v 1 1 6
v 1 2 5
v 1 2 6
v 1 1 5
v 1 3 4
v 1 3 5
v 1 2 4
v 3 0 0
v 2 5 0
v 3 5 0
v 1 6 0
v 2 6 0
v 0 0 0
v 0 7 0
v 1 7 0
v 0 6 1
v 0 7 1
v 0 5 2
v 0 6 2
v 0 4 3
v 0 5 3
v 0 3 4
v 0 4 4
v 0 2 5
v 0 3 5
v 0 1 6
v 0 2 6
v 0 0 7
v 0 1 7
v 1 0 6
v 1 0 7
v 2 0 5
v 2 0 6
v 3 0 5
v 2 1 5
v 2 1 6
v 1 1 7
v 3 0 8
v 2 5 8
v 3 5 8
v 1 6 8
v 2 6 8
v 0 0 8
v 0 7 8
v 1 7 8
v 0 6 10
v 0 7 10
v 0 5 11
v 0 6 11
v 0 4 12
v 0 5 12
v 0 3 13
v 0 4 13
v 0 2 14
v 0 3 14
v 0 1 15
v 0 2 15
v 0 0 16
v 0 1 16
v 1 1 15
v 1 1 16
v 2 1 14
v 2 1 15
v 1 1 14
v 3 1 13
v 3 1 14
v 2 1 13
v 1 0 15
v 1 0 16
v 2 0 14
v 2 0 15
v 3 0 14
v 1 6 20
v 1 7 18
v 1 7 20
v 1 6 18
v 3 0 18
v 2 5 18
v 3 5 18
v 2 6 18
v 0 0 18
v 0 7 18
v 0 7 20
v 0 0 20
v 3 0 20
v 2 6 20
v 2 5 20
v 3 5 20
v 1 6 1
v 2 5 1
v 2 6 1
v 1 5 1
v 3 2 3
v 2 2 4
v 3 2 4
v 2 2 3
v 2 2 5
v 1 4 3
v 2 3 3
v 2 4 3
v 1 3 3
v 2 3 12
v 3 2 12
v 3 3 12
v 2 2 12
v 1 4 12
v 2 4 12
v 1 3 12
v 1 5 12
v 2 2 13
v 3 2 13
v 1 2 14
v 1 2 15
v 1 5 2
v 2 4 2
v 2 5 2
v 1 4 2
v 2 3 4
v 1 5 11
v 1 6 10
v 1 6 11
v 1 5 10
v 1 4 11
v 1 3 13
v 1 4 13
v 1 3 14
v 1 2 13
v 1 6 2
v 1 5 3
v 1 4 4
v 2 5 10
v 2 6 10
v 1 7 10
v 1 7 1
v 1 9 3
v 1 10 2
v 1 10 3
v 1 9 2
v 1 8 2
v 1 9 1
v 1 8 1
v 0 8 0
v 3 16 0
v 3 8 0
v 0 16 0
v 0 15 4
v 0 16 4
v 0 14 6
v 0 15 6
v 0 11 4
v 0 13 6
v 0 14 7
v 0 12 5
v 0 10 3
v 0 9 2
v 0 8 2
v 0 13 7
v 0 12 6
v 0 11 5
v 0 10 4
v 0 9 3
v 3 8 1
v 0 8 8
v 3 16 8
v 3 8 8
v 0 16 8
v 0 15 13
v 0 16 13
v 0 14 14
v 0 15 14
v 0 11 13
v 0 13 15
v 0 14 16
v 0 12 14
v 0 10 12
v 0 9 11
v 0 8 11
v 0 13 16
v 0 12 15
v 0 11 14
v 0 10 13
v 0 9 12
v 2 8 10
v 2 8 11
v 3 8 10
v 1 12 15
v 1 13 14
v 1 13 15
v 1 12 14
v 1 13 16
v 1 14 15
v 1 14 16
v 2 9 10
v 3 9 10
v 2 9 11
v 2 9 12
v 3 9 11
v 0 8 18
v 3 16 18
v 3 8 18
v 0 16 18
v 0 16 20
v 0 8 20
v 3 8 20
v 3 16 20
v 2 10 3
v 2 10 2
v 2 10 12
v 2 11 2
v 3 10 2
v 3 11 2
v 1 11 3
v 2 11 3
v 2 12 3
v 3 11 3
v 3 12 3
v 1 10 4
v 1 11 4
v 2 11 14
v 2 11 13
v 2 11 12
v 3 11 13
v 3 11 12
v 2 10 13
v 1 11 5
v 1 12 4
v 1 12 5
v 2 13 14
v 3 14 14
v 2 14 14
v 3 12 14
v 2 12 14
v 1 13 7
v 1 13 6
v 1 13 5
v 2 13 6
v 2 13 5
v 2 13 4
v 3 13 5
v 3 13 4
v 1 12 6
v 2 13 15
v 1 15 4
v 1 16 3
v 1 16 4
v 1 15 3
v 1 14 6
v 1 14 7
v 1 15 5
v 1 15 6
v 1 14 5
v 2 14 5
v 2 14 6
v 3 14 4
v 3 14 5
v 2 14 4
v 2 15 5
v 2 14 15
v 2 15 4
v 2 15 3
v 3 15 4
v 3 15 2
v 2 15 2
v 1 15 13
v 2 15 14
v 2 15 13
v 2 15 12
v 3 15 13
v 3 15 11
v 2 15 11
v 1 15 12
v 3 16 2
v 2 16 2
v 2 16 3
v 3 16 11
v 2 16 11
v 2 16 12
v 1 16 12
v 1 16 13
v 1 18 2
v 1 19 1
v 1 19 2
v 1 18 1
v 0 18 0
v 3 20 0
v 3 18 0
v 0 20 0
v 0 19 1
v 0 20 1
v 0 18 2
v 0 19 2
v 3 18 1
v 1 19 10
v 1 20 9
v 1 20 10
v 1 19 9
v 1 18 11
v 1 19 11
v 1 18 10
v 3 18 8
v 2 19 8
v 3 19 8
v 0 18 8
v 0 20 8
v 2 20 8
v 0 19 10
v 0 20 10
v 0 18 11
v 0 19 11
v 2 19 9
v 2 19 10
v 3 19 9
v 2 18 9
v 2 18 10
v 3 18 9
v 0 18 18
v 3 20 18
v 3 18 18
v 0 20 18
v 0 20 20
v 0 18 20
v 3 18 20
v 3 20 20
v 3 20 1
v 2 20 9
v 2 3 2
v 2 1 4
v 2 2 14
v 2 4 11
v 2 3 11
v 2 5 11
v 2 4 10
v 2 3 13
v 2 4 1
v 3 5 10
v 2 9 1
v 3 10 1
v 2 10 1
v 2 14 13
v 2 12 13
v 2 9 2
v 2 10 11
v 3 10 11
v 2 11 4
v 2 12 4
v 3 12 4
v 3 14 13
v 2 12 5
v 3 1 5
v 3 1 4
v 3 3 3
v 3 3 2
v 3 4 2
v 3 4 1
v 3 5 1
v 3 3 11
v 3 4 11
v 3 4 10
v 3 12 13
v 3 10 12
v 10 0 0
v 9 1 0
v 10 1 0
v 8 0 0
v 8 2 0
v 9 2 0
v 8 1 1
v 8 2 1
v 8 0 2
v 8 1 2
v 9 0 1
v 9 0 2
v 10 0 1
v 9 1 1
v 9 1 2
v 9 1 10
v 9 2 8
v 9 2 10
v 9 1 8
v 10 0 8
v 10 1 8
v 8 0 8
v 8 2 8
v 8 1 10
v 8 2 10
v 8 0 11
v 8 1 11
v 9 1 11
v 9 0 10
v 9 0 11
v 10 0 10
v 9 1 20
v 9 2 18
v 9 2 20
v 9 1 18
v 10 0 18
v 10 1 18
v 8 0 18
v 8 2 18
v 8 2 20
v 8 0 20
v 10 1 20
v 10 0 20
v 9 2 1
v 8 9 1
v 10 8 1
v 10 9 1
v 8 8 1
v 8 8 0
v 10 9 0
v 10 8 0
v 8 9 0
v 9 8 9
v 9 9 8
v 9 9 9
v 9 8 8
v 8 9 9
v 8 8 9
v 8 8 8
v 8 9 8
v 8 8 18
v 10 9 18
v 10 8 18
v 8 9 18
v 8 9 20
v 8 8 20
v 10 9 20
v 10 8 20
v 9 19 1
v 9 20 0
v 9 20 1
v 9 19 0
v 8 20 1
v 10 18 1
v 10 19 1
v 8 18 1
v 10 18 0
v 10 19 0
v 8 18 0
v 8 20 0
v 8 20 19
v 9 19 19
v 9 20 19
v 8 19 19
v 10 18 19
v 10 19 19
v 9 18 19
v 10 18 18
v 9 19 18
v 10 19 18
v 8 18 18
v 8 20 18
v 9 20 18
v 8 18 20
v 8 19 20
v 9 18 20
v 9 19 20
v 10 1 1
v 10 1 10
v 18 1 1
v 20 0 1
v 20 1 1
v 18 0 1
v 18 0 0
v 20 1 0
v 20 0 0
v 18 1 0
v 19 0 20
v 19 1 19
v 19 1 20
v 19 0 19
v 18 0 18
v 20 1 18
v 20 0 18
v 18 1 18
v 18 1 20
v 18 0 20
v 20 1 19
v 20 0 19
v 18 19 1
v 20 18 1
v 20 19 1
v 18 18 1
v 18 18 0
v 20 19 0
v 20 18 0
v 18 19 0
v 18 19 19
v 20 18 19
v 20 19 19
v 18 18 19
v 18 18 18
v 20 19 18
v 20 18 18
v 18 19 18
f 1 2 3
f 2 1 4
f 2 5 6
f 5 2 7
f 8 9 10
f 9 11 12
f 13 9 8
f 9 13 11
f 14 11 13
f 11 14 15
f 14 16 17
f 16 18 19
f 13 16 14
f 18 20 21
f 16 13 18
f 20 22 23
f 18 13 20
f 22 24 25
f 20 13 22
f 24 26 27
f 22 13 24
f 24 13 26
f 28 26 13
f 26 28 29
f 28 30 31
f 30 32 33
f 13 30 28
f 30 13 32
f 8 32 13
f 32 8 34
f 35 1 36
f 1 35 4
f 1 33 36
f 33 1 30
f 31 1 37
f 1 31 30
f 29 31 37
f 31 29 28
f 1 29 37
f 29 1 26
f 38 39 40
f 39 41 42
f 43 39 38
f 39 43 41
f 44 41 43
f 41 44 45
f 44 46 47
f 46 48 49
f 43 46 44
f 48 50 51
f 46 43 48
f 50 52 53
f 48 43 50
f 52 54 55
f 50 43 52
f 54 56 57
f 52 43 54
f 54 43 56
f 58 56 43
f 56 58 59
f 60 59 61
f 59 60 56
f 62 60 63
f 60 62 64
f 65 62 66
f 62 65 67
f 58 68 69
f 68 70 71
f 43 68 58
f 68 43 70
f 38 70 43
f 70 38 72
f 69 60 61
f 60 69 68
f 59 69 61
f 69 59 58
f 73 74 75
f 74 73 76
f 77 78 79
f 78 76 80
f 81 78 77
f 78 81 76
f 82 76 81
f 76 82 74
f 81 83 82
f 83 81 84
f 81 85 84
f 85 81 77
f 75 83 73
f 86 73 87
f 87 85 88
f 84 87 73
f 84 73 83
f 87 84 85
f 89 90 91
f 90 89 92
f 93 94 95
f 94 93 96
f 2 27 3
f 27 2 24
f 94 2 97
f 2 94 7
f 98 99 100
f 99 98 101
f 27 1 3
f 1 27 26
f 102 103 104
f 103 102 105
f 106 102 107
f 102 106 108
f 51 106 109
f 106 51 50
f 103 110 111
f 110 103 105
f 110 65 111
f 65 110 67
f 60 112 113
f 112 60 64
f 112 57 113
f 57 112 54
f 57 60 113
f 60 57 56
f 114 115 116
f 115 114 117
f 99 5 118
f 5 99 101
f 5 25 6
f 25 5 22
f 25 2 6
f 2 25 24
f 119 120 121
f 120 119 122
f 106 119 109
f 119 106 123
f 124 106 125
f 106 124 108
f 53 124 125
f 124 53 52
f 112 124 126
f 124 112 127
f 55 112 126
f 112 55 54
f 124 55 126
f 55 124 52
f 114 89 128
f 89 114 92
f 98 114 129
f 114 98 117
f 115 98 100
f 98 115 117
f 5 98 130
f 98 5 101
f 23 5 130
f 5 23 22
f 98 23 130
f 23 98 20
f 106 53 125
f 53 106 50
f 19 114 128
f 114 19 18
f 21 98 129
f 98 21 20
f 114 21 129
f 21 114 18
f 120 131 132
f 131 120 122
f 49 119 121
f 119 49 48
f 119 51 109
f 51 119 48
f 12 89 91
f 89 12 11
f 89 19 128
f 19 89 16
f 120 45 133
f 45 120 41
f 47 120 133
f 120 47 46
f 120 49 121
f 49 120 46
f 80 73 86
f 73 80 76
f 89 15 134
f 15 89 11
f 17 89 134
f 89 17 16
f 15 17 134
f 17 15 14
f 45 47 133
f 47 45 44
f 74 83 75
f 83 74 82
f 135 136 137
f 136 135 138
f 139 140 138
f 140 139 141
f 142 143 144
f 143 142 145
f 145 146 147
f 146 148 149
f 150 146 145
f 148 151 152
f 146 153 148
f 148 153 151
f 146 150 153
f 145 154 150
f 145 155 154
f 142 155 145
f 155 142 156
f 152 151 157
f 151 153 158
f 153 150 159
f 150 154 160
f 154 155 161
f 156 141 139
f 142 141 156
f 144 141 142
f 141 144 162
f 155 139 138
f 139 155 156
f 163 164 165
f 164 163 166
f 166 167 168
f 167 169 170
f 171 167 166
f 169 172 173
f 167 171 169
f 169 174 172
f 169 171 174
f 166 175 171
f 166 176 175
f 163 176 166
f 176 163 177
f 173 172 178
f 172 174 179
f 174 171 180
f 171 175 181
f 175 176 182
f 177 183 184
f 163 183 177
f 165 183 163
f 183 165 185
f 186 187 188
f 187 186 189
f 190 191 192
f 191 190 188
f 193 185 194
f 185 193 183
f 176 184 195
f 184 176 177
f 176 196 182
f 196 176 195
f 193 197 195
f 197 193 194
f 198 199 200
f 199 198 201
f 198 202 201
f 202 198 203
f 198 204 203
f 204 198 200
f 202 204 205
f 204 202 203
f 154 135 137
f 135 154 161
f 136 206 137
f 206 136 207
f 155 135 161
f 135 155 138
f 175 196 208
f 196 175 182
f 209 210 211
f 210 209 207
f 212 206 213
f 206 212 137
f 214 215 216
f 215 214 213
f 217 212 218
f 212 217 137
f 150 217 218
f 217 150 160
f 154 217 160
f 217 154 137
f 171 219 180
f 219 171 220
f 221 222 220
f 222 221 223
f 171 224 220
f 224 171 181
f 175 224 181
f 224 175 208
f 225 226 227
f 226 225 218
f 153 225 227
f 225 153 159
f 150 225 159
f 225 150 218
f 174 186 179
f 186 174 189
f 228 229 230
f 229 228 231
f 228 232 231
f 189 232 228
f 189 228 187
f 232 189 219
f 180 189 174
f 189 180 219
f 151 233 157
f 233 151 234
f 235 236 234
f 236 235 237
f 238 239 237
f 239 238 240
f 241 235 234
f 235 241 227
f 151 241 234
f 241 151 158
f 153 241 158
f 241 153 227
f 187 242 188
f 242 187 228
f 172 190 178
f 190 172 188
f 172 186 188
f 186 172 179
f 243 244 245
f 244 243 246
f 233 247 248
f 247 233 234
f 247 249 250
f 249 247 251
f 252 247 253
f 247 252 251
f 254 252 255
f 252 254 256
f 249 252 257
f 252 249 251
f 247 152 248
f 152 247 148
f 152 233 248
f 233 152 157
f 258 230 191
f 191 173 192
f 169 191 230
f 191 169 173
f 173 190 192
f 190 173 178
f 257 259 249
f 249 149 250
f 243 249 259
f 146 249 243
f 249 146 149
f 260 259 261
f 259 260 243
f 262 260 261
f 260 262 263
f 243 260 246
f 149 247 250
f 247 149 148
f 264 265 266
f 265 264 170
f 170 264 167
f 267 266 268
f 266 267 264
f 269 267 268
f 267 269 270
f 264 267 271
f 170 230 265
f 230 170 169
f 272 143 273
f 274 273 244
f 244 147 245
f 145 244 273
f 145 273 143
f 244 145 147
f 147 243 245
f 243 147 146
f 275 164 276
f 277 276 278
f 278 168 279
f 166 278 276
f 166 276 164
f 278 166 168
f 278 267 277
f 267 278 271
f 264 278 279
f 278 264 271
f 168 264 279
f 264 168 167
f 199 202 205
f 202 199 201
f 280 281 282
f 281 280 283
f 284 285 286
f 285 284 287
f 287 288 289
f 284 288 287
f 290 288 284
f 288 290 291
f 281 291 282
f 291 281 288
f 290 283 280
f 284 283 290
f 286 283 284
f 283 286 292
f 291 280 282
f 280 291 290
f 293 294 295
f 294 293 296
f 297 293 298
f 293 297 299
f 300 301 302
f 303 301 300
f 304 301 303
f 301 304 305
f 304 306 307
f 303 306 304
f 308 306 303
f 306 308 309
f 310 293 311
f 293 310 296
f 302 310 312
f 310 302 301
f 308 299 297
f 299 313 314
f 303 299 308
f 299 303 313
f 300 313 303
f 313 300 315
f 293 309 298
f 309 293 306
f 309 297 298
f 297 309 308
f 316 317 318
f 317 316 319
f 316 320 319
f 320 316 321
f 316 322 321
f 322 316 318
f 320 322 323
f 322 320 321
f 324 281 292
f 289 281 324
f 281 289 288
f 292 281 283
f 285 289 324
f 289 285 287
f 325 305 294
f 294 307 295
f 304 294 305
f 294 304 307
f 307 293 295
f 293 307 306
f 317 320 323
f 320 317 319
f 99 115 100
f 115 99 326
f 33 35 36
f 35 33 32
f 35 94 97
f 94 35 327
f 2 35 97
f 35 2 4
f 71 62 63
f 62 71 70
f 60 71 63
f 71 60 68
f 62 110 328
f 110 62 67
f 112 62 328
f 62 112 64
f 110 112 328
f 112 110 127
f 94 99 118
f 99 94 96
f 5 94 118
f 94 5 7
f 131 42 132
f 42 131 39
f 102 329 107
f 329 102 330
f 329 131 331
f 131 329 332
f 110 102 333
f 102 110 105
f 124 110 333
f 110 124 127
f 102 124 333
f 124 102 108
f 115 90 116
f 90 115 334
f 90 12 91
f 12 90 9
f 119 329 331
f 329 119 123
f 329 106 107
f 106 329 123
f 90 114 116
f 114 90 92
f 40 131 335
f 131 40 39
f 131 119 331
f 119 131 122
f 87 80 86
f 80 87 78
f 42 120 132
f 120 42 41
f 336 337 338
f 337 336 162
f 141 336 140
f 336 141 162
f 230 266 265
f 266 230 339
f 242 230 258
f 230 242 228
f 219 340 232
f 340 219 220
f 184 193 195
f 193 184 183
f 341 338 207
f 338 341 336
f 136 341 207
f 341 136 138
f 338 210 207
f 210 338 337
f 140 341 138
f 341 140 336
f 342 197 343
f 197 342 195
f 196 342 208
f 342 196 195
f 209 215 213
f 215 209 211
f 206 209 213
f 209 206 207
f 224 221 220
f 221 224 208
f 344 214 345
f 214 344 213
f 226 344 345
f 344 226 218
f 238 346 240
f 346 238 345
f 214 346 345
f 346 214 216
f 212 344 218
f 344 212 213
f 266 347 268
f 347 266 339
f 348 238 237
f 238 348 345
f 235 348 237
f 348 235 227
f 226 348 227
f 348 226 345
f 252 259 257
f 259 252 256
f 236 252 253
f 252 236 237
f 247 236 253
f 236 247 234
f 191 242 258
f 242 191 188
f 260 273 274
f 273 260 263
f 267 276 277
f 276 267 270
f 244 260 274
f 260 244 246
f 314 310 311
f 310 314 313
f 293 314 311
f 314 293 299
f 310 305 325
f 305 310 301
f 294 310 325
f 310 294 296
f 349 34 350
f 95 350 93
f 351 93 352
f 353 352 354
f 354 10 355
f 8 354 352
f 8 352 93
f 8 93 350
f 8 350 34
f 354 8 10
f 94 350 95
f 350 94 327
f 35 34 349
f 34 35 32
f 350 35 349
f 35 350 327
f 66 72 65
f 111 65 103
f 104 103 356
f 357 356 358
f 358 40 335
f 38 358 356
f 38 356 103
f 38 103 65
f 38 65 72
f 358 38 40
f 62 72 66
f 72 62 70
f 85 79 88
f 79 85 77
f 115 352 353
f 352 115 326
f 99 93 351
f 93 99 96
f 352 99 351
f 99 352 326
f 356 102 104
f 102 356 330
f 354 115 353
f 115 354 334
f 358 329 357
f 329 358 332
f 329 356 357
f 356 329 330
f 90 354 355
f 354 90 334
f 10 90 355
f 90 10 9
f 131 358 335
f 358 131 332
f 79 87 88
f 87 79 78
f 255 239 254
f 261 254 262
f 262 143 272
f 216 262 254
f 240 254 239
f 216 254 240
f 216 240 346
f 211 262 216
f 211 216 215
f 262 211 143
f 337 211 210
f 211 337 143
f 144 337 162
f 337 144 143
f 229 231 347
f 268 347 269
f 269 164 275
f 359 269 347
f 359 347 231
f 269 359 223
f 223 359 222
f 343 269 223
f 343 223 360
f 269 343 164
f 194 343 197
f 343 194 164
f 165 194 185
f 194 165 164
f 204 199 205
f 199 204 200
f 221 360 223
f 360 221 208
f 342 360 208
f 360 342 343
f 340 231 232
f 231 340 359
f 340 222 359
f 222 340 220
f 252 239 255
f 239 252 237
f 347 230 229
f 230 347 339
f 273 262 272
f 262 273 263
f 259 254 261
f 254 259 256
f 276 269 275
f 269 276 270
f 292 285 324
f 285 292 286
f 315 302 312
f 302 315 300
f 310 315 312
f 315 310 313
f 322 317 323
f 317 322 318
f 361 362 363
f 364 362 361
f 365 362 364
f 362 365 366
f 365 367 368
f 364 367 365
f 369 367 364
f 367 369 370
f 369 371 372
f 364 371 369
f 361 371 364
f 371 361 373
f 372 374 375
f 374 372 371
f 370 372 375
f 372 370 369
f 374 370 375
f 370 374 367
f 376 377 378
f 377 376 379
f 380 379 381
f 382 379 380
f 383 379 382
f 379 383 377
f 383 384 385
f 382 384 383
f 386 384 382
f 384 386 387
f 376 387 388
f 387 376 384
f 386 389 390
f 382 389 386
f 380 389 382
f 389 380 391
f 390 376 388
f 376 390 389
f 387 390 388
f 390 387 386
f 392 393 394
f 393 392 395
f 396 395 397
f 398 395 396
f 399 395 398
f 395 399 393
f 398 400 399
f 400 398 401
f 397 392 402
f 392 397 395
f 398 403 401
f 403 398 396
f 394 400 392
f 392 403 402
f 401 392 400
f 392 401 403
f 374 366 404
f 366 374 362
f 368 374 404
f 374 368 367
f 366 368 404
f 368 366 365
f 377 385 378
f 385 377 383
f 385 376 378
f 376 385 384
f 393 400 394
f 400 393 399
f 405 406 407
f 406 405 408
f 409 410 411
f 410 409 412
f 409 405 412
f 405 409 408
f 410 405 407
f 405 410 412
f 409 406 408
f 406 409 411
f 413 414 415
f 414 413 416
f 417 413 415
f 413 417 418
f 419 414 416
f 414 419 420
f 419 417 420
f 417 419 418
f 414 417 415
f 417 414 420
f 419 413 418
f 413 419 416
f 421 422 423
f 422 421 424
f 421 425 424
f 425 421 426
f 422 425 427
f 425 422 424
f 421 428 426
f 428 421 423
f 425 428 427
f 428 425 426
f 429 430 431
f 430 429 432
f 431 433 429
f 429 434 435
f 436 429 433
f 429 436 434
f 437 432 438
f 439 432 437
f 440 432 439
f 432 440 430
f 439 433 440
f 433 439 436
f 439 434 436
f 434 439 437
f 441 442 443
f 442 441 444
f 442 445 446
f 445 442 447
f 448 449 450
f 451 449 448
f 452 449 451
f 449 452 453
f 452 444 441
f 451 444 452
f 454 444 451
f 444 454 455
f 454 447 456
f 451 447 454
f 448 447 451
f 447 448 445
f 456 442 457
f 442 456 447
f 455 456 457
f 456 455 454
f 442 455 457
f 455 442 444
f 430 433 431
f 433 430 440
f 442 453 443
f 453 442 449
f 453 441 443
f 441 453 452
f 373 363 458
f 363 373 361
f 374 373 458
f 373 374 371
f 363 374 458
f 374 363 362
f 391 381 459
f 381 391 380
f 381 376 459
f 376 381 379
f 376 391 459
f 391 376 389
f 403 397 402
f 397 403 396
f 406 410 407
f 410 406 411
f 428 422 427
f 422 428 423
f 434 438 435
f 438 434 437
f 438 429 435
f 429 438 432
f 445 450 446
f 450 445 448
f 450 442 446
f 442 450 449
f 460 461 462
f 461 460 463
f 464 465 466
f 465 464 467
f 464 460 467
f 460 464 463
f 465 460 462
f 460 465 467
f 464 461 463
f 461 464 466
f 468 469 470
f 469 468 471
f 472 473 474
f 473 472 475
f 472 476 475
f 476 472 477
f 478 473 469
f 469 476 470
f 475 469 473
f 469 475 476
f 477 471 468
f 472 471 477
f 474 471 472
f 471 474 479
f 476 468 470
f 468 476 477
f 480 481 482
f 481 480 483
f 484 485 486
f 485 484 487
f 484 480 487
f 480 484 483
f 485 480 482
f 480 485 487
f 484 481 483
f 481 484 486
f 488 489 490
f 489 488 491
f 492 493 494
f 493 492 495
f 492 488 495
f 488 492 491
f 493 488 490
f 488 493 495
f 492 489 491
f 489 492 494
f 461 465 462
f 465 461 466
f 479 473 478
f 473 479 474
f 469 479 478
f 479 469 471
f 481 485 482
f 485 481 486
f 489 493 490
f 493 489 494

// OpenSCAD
union() {
    translate([0, 0, 0]) cube([1, 1, 1]);
    translate([0, 0, 1]) cube([1, 1, 1]);
    translate([0, 0, 2]) cube([1, 1, 1]);
    translate([0, 0, 3]) cube([1, 1, 1]);
    translate([0, 0, 4]) cube([1, 1, 1]);
    translate([0, 0, 5]) cube([1, 1, 1]);
    translate([0, 0, 6]) cube([1, 1, 1]);
    translate([0, 0, 8]) cube([1, 1, 1]);
    translate([0, 0, 9]) cube([1, 1, 1]);
    translate([0, 0, 10]) cube([1, 1, 1]);
    translate([0, 0, 11]) cube([1, 1, 1]);
    translate([0, 0, 12]) cube([1, 1, 1]);
    translate([0, 0, 13]) cube([1, 1, 1]);
    translate([0, 0, 14]) cube([1, 1, 1]);
    translate([0, 0, 15]) cube([1, 1, 1]);
    translate([0, 0, 18]) cube([1, 1, 1]);
    translate([0, 0, 19]) cube([1, 1, 1]);
    translate([0, 1, 0]) cube([1, 1, 1]);
    translate([0, 1, 1]) cube([1, 1, 1]);
    translate([0, 1, 2]) cube([1, 1, 1]);
    translate([0, 1, 3]) cube([1, 1, 1]);
    translate([0, 1, 4]) cube([1, 1, 1]);
    translate([0, 1, 5]) cube([1, 1, 1]);
    translate([0, 1, 8]) cube([1, 1, 1]);
    translate([0, 1, 9]) cube([1, 1, 1]);
    translate([0, 1, 10]) cube([1, 1, 1]);
    translate([0, 1, 11]) cube([1, 1, 1]);
    translate([0, 1, 12]) cube([1, 1, 1]);
    translate([0, 1, 13]) cube([1, 1, 1]);
    translate([0, 1, 14]) cube([1, 1, 1]);
    translate([0, 1, 18]) cube([1, 1, 1]);
    translate([0, 1, 19]) cube([1, 1, 1]);
    translate([0, 2, 0]) cube([1, 1, 1]);
    translate([0, 2, 1]) cube([1, 1, 1]);
    translate([0, 2, 2]) cube([1, 1, 1]);
    translate([0, 2, 3]) cube([1, 1, 1]);
    translate([0, 2, 4]) cube([1, 1, 1]);
    translate([0, 2, 8]) cube([1, 1, 1]);
    translate([0, 2, 9]) cube([1, 1, 1]);
    translate([0, 2, 10]) cube([1, 1, 1]);
    translate([0, 2, 11]) cube([1, 1, 1]);
    translate([0, 2, 12]) cube([1, 1, 1]);
    translate([0, 2, 13]) cube([1, 1, 1]);
    translate([0, 2, 18]) cube([1, 1, 1]);
    translate([0, 2, 19]) cube([1, 1, 1]);
    translate([0, 3, 0]) cube([1, 1, 1]);
    translate([0, 3, 1]) cube([1, 1, 1]);
    translate([0, 3, 2]) cube([1, 1, 1]);
    translate([0, 3, 3]) cube([1, 1, 1]);
    translate([0, 3, 8]) cube([1, 1, 1]);
    translate([0, 3, 9]) cube([1, 1, 1]);
    translate([0, 3, 10]) cube([1, 1, 1]);
    translate([0, 3, 11]) cube([1, 1, 1]);
    translate([0, 3, 12]) cube([1, 1, 1]);
    translate([0, 3, 18]) cube([1, 1, 1]);
    translate([0, 3, 19]) cube([1, 1, 1]);
    translate([0, 4, 0]) cube([1, 1, 1]);
    translate([0, 4, 1]) cube([1, 1, 1]);
    translate([0, 4, 2]) cube([1, 1, 1]);
    translate([0, 4, 8]) cube([1, 1, 1]);
    translate([0, 4, 9]) cube([1, 1, 1]);
    translate([0, 4, 10]) cube([1, 1, 1]);
    translate([0, 4, 11]) cube([1, 1, 1]);
    translate([0, 4, 18]) cube([1, 1, 1]);
    translate([0, 4, 19]) cube([1, 1, 1]);
    translate([0, 5, 0]) cube([1, 1, 1]);
    translate([0, 5, 1]) cube([1, 1, 1]);
    translate([0, 5, 8]) cube([1, 1, 1]);
    translate([0, 5, 9]) cube([1, 1, 1]);
    translate([0, 5, 10]) cube([1, 1, 1]);
    translate([0, 5, 18]) cube([1, 1, 1]);
    translate([0, 5, 19]) cube([1, 1, 1]);
    translate([0, 6, 0]) cube([1, 1, 1]);
    translate([0, 6, 8]) cube([1, 1, 1]);
    translate([0, 6, 9]) cube([1, 1, 1]);
    translate([0, 6, 18]) cube([1, 1, 1]);
    translate([0, 6, 19]) cube([1, 1, 1]);
    translate([0, 8, 0]) cube([1, 1, 1]);
    translate([0, 8, 1]) cube([1, 1, 1]);
    translate([0, 8, 8]) cube([1, 1, 1]);
    translate([0, 8, 9]) cube([1, 1, 1]);
    translate([0, 8, 10]) cube([1, 1, 1]);
    translate([0, 8, 18]) cube([1, 1, 1]);
    translate([0, 8, 19]) cube([1, 1, 1]);
    translate([0, 9, 0]) cube([1, 1, 1]);
    translate([0, 9, 1]) cube([1, 1, 1]);
    translate([0, 9, 2]) cube([1, 1, 1]);
    translate([0, 9, 8]) cube([1, 1, 1]);
    translate([0, 9, 9]) cube([1, 1, 1]);
    translate([0, 9, 10]) cube([1, 1, 1]);
    translate([0, 9, 11]) cube([1, 1, 1]);
    translate([0, 9, 18]) cube([1, 1, 1]);
    translate([0, 9, 19]) cube([1, 1, 1]);
    translate([0, 10, 0]) cube([1, 1, 1]);
    translate([0, 10, 1]) cube([1, 1, 1]);
    translate([0, 10, 2]) cube([1, 1, 1]);
    translate([0, 10, 3]) cube([1, 1, 1]);
    translate([0, 10, 8]) cube([1, 1, 1]);
    translate([0, 10, 9]) cube([1, 1, 1]);
    translate([0, 10, 10]) cube([1, 1, 1]);
    translate([0, 10, 11]) cube([1, 1, 1]);
    translate([0, 10, 12]) cube([1, 1, 1]);
    translate([0, 10, 18]) cube([1, 1, 1]);
    translate([0, 10, 19]) cube([1, 1, 1]);
    translate([0, 11, 0]) cube([1, 1, 1]);
    translate([0, 11, 1]) cube([1, 1, 1]);
    translate([0, 11, 2]) cube([1, 1, 1]);
    translate([0, 11, 3]) cube([1, 1, 1]);
    translate([0, 11, 4]) cube([1, 1, 1]);
    translate([0, 11, 8]) cube([1, 1, 1]);
    translate([0, 11, 9]) cube([1, 1, 1]);
    translate([0, 11, 10]) cube([1, 1, 1]);
    translate([0, 11, 11]) cube([1, 1, 1]);
    translate([0, 11, 12]) cube([1, 1, 1]);
    translate([0, 11, 13]) cube([1, 1, 1]);
    translate([0, 11, 18]) cube([1, 1, 1]);
    translate([0, 11, 19]) cube([1, 1, 1]);
    translate([0, 12, 0]) cube([1, 1, 1]);
    translate([0, 12, 1]) cube([1, 1, 1]);
    translate([0, 12, 2]) cube([1, 1, 1]);
    translate([0, 12, 3]) cube([1, 1, 1]);
    translate([0, 12, 4]) cube([1, 1, 1]);
    translate([0, 12, 5]) cube([1, 1, 1]);
    translate([0, 12, 8]) cube([1, 1, 1]);
    translate([0, 12, 9]) cube([1, 1, 1]);
    translate([0, 12, 10]) cube([1, 1, 1]);
    translate([0, 12, 11]) cube([1, 1, 1]);
    translate([0, 12, 12]) cube([1, 1, 1]);
    translate([0, 12, 13]) cube([1, 1, 1]);
    translate([0, 12, 14]) cube([1, 1, 1]);
    translate([0, 12, 18]) cube([1, 1, 1]);
    translate([0, 12, 19]) cube([1, 1, 1]);
    translate([0, 13, 0]) cube([1, 1, 1]);
    translate([0, 13, 1]) cube([1, 1, 1]);
    translate([0, 13, 2]) cube([1, 1, 1]);
    translate([0, 13, 3]) cube([1, 1, 1]);
    translate([0, 13, 4]) cube([1, 1, 1]);
    translate([0, 13, 5]) cube([1, 1, 1]);
    translate([0, 13, 6]) cube([1, 1, 1]);
    translate([0, 13, 8]) cube([1, 1, 1]);
    translate([0, 13, 9]) cube([1, 1, 1]);
    translate([0, 13, 10]) cube([1, 1, 1]);
    translate([0, 13, 11]) cube([1, 1, 1]);
    translate([0, 13, 12]) cube([1, 1, 1]);
    translate([0, 13, 13]) cube([1, 1, 1]);
    translate([0, 13, 14]) cube([1, 1, 1]);
    translate([0, 13, 15]) cube([1, 1, 1]);
    translate([0, 13, 18]) cube([1, 1, 1]);
    translate([0, 13, 19]) cube([1, 1, 1]);
    translate([0, 14, 0]) cube([1, 1, 1]);
    translate([0, 14, 1]) cube([1, 1, 1]);
    translate([0, 14, 2]) cube([1, 1, 1]);
    translate([0, 14, 3]) cube([1, 1, 1]);
    translate([0, 14, 4]) cube([1, 1, 1]);
    translate([0, 14, 5]) cube([1, 1, 1]);
    translate([0, 14, 8]) cube([1, 1, 1]);
    translate([0, 14, 9]) cube([1, 1, 1]);
    translate([0, 14, 10]) cube([1, 1, 1]);
    translate([0, 14, 11]) cube([1, 1, 1]);
    translate([0, 14, 12]) cube([1, 1, 1]);
    translate([0, 14, 13]) cube([1, 1, 1]);
    translate([0, 14, 18]) cube([1, 1, 1]);
    translate([0, 14, 19]) cube([1, 1, 1]);
    translate([0, 15, 0]) cube([1, 1, 1]);
    translate([0, 15, 1]) cube([1, 1, 1]);
    translate([0, 15, 2]) cube([1, 1, 1]);
    translate([0, 15, 3]) cube([1, 1, 1]);
    translate([0, 15, 8]) cube([1, 1, 1]);
    translate([0, 15, 9]) cube([1, 1, 1]);
    translate([0, 15, 10]) cube([1, 1, 1]);
    translate([0, 15, 11]) cube([1, 1, 1]);
    translate([0, 15, 12]) cube([1, 1, 1]);
    translate([0, 15, 18]) cube([1, 1, 1]);
    translate([0, 15, 19]) cube([1, 1, 1]);
    translate([0, 18, 0]) cube([1, 1, 1]);
    translate([0, 18, 1]) cube([1, 1, 1]);
    translate([0, 18, 8]) cube([1, 1, 1]);
    translate([0, 18, 9]) cube([1, 1, 1]);
    translate([0, 18, 10]) cube([1, 1, 1]);
    translate([0, 18, 18]) cube([1, 1, 1]);
    translate([0, 18, 19]) cube([1, 1, 1]);
    translate([0, 19, 0]) cube([1, 1, 1]);
    translate([0, 19, 8]) cube([1, 1, 1]);
    translate([0, 19, 9]) cube([1, 1, 1]);
    translate([0, 19, 18]) cube([1, 1, 1]);
    translate([0, 19, 19]) cube([1, 1, 1]);
    translate([1, 0, 0]) cube([1, 1, 1]);
    translate([1, 0, 1]) cube([1, 1, 1]);
    translate([1, 0, 2]) cube([1, 1, 1]);
    translate([1, 0, 3]) cube([1, 1, 1]);
    translate([1, 0, 4]) cube([1, 1, 1]);
    translate([1, 0, 5]) cube([1, 1, 1]);
    translate([1, 0, 8]) cube([1, 1, 1]);
    translate([1, 0, 9]) cube([1, 1, 1]);
    translate([1, 0, 10]) cube([1, 1, 1]);
    translate([1, 0, 11]) cube([1, 1, 1]);
    translate([1, 0, 12]) cube([1, 1, 1]);
    translate([1, 0, 13]) cube([1, 1, 1]);
    translate([1, 0, 14]) cube([1, 1, 1]);
    translate([1, 0, 18]) cube([1, 1, 1]);
    translate([1, 0, 19]) cube([1, 1, 1]);
    translate([1, 1, 0]) cube([1, 1, 1]);
    translate([1, 1, 1]) cube([1, 1, 1]);
    translate([1, 1, 2]) cube([1, 1, 1]);
    translate([1, 1, 3]) cube([1, 1, 1]);
    translate([1, 1, 4]) cube([1, 1, 1]);
    translate([1, 1, 8]) cube([1, 1, 1]);
    translate([1, 1, 9]) cube([1, 1, 1]);
    translate([1, 1, 10]) cube([1, 1, 1]);
    translate([1, 1, 11]) cube([1, 1, 1]);
    translate([1, 1, 12]) cube([1, 1, 1]);
    translate([1, 1, 13]) cube([1, 1, 1]);
    translate([1, 1, 18]) cube([1, 1, 1]);
    translate([1, 1, 19]) cube([1, 1, 1]);
    translate([1, 2, 0]) cube([1, 1, 1]);
    translate([1, 2, 1]) cube([1, 1, 1]);
    translate([1, 2, 2]) cube([1, 1, 1]);
    translate([1, 2, 3]) cube([1, 1, 1]);
    translate([1, 2, 8]) cube([1, 1, 1]);
    translate([1, 2, 9]) cube([1, 1, 1]);
    translate([1, 2, 10]) cube([1, 1, 1]);
    translate([1, 2, 11]) cube([1, 1, 1]);
    translate([1, 2, 12]) cube([1, 1, 1]);
    translate([1, 2, 18]) cube([1, 1, 1]);
    translate([1, 2, 19]) cube([1, 1, 1]);
    translate([1, 3, 0]) cube([1, 1, 1]);
    translate([1, 3, 1]) cube([1, 1, 1]);
    translate([1, 3, 2]) cube([1, 1, 1]);
    translate([1, 3, 8]) cube([1, 1, 1]);
    translate([1, 3, 9]) cube([1, 1, 1]);
    translate([1, 3, 10]) cube([1, 1, 1]);
    translate([1, 3, 11]) cube([1, 1, 1]);
    translate([1, 3, 18]) cube([1, 1, 1]);
    translate([1, 3, 19]) cube([1, 1, 1]);
    translate([1, 4, 0]) cube([1, 1, 1]);
    translate([1, 4, 1]) cube([1, 1, 1]);
    translate([1, 4, 8]) cube([1, 1, 1]);
    translate([1, 4, 9]) cube([1, 1, 1]);
    translate([1, 4, 10]) cube([1, 1, 1]);
    translate([1, 4, 18]) cube([1, 1, 1]);
    translate([1, 4, 19]) cube([1, 1, 1]);
    translate([1, 5, 0]) cube([1, 1, 1]);
    translate([1, 5, 8]) cube([1, 1, 1]);
    translate([1, 5, 9]) cube([1, 1, 1]);
    translate([1, 5, 18]) cube([1, 1, 1]);
    translate([1, 5, 19]) cube([1, 1, 1]);
    translate([1, 8, 0]) cube([1, 1, 1]);
    translate([1, 8, 8]) cube([1, 1, 1]);
    translate([1, 8, 9]) cube([1, 1, 1]);
    translate([1, 8, 10]) cube([1, 1, 1]);
    translate([1, 8, 18]) cube([1, 1, 1]);
    translate([1, 8, 19]) cube([1, 1, 1]);
    translate([1, 9, 0]) cube([1, 1, 1]);
    translate([1, 9, 1]) cube([1, 1, 1]);
    translate([1, 9, 8]) cube([1, 1, 1]);
    translate([1, 9, 9]) cube([1, 1, 1]);
    translate([1, 9, 10]) cube([1, 1, 1]);
    translate([1, 9, 11]) cube([1, 1, 1]);
    translate([1, 9, 18]) cube([1, 1, 1]);
    translate([1, 9, 19]) cube([1, 1, 1]);
    translate([1, 10, 0]) cube([1, 1, 1]);
    translate([1, 10, 1]) cube([1, 1, 1]);
    translate([1, 10, 2]) cube([1, 1, 1]);
    translate([1, 10, 8]) cube([1, 1, 1]);
    translate([1, 10, 9]) cube([1, 1, 1]);
    translate([1, 10, 10]) cube([1, 1, 1]);
    translate([1, 10, 11]) cube([1, 1, 1]);
    translate([1, 10, 12]) cube([1, 1, 1]);
    translate([1, 10, 18]) cube([1, 1, 1]);
    translate([1, 10, 19]) cube([1, 1, 1]);
    translate([1, 11, 0]) cube([1, 1, 1]);
    translate([1, 11, 1]) cube([1, 1, 1]);
    translate([1, 11, 2]) cube([1, 1, 1]);
    translate([1, 11, 3]) cube([1, 1, 1]);
    translate([1, 11, 8]) cube([1, 1, 1]);
    translate([1, 11, 9]) cube([1, 1, 1]);
    translate([1, 11, 10]) cube([1, 1, 1]);
    translate([1, 11, 11]) cube([1, 1, 1]);
    translate([1, 11, 12]) cube([1, 1, 1]);
    translate([1, 11, 13]) cube([1, 1, 1]);
    translate([1, 11, 18]) cube([1, 1, 1]);
    translate([1, 11, 19]) cube([1, 1, 1]);
    translate([1, 12, 0]) cube([1, 1, 1]);
    translate([1, 12, 1]) cube([1, 1, 1]);
    translate([1, 12, 2]) cube([1, 1, 1]);
    translate([1, 12, 3]) cube([1, 1, 1]);
    translate([1, 12, 4]) cube([1, 1, 1]);
    translate([1, 12, 8]) cube([1, 1, 1]);
    translate([1, 12, 9]) cube([1, 1, 1]);
    translate([1, 12, 10]) cube([1, 1, 1]);
    translate([1, 12, 11]) cube([1, 1, 1]);
    translate([1, 12, 12]) cube([1, 1, 1]);
    translate([1, 12, 13]) cube([1, 1, 1]);
    translate([1, 12, 18]) cube([1, 1, 1]);
    translate([1, 12, 19]) cube([1, 1, 1]);
    translate([1, 13, 0]) cube([1, 1, 1]);
    translate([1, 13, 1]) cube([1, 1, 1]);
    translate([1, 13, 2]) cube([1, 1, 1]);
    translate([1, 13, 3]) cube([1, 1, 1]);
    translate([1, 13, 4]) cube([1, 1, 1]);
    translate([1, 13, 5]) cube([1, 1, 1]);
    translate([1, 13, 8]) cube([1, 1, 1]);
    translate([1, 13, 9]) cube([1, 1, 1]);
    translate([1, 13, 10]) cube([1, 1, 1]);
    translate([1, 13, 11]) cube([1, 1, 1]);
    translate([1, 13, 12]) cube([1, 1, 1]);
    translate([1, 13, 13]) cube([1, 1, 1]);
    translate([1, 13, 14]) cube([1, 1, 1]);
    translate([1, 13, 18]) cube([1, 1, 1]);
    translate([1, 13, 19]) cube([1, 1, 1]);
    translate([1, 14, 0]) cube([1, 1, 1]);
    translate([1, 14, 1]) cube([1, 1, 1]);
    translate([1, 14, 2]) cube([1, 1, 1]);
    translate([1, 14, 3]) cube([1, 1, 1]);
    translate([1, 14, 4]) cube([1, 1, 1]);
    translate([1, 14, 8]) cube([1, 1, 1]);
    translate([1, 14, 9]) cube([1, 1, 1]);
    translate([1, 14, 10]) cube([1, 1, 1]);
    translate([1, 14, 11]) cube([1, 1, 1]);
    translate([1, 14, 12]) cube([1, 1, 1]);
    translate([1, 14, 13]) cube([1, 1, 1]);
    translate([1, 14, 18]) cube([1, 1, 1]);
    translate([1, 14, 19]) cube([1, 1, 1]);
    translate([1, 15, 0]) cube([1, 1, 1]);
    translate([1, 15, 1]) cube([1, 1, 1]);
    translate([1, 15, 2]) cube([1, 1, 1]);
    translate([1, 15, 8]) cube([1, 1, 1]);
    translate([1, 15, 9]) cube([1, 1, 1]);
    translate([1, 15, 10]) cube([1, 1, 1]);
    translate([1, 15, 11]) cube([1, 1, 1]);
    translate([1, 15, 18]) cube([1, 1, 1]);
    translate([1, 15, 19]) cube([1, 1, 1]);
    translate([1, 18, 0]) cube([1, 1, 1]);
    translate([1, 18, 8]) cube([1, 1, 1]);
    translate([1, 18, 9]) cube([1, 1, 1]);
    translate([1, 18, 18]) cube([1, 1, 1]);
    translate([1, 18, 19]) cube([1, 1, 1]);
    translate([1, 19, 0]) cube([1, 1, 1]);
    translate([1, 19, 8]) cube([1, 1, 1]);
    translate([1, 19, 18]) cube([1, 1, 1]);
    translate([1, 19, 19]) cube([1, 1, 1]);
    translate([2, 0, 0]) cube([1, 1, 1]);
    translate([2, 0, 1]) cube([1, 1, 1]);
    translate([2, 0, 2]) cube([1, 1, 1]);
    translate([2, 0, 3]) cube([1, 1, 1]);
    translate([2, 0, 4]) cube([1, 1, 1]);
    translate([2, 0, 8]) cube([1, 1, 1]);
    translate([2, 0, 9]) cube([1, 1, 1]);
    translate([2, 0, 10]) cube([1, 1, 1]);
    translate([2, 0, 11]) cube([1, 1, 1]);
    translate([2, 0, 12]) cube([1, 1, 1]);
    translate([2, 0, 13]) cube([1, 1, 1]);
    translate([2, 0, 18]) cube([1, 1, 1]);
    translate([2, 0, 19]) cube([1, 1, 1]);
    translate([2, 1, 0]) cube([1, 1, 1]);
    translate([2, 1, 1]) cube([1, 1, 1]);
    translate([2, 1, 2]) cube([1, 1, 1]);
    translate([2, 1, 3]) cube([1, 1, 1]);
    translate([2, 1, 8]) cube([1, 1, 1]);
    translate([2, 1, 9]) cube([1, 1, 1]);
    translate([2, 1, 10]) cube([1, 1, 1]);
    translate([2, 1, 11]) cube([1, 1, 1]);
    translate([2, 1, 12]) cube([1, 1, 1]);
    translate([2, 1, 18]) cube([1, 1, 1]);
    translate([2, 1, 19]) cube([1, 1, 1]);
    translate([2, 2, 0]) cube([1, 1, 1]);
    translate([2, 2, 1]) cube([1, 1, 1]);
    translate([2, 2, 2]) cube([1, 1, 1]);
    translate([2, 2, 8]) cube([1, 1, 1]);
    translate([2, 2, 9]) cube([1, 1, 1]);
    translate([2, 2, 10]) cube([1, 1, 1]);
    translate([2, 2, 11]) cube([1, 1, 1]);
    translate([2, 2, 18]) cube([1, 1, 1]);
    translate([2, 2, 19]) cube([1, 1, 1]);
    translate([2, 3, 0]) cube([1, 1, 1]);
    translate([2, 3, 1]) cube([1, 1, 1]);
    translate([2, 3, 8]) cube([1, 1, 1]);
    translate([2, 3, 9]) cube([1, 1, 1]);
    translate([2, 3, 10]) cube([1, 1, 1]);
    translate([2, 3, 18]) cube([1, 1, 1]);
    translate([2, 3, 19]) cube([1, 1, 1]);
    translate([2, 4, 0]) cube([1, 1, 1]);
    translate([2, 4, 8]) cube([1, 1, 1]);
    translate([2, 4, 9]) cube([1, 1, 1]);
    translate([2, 4, 18]) cube([1, 1, 1]);
    translate([2, 4, 19]) cube([1, 1, 1]);
    translate([2, 8, 0]) cube([1, 1, 1]);
    translate([2, 8, 8]) cube([1, 1, 1]);
    translate([2, 8, 9]) cube([1, 1, 1]);
    translate([2, 8, 18]) cube([1, 1, 1]);
    translate([2, 8, 19]) cube([1, 1, 1]);
    translate([2, 9, 0]) cube([1, 1, 1]);
    translate([2, 9, 8]) cube([1, 1, 1]);
    translate([2, 9, 9]) cube([1, 1, 1]);
    translate([2, 9, 10]) cube([1, 1, 1]);
    translate([2, 9, 18]) cube([1, 1, 1]);
    translate([2, 9, 19]) cube([1, 1, 1]);
    translate([2, 10, 0]) cube([1, 1, 1]);
    translate([2, 10, 1]) cube([1, 1, 1]);
    translate([2, 10, 8]) cube([1, 1, 1]);
    translate([2, 10, 9]) cube([1, 1, 1]);
    translate([2, 10, 10]) cube([1, 1, 1]);
    translate([2, 10, 11]) cube([1, 1, 1]);
    translate([2, 10, 18]) cube([1, 1, 1]);
    translate([2, 10, 19]) cube([1, 1, 1]);
    translate([2, 11, 0]) cube([1, 1, 1]);
    translate([2, 11, 1]) cube([1, 1, 1]);
    translate([2, 11, 2]) cube([1, 1, 1]);
    translate([2, 11, 8]) cube([1, 1, 1]);
    translate([2, 11, 9]) cube([1, 1, 1]);
    translate([2, 11, 10]) cube([1, 1, 1]);
    translate([2, 11, 11]) cube([1, 1, 1]);
    translate([2, 11, 12]) cube([1, 1, 1]);
    translate([2, 11, 18]) cube([1, 1, 1]);
    translate([2, 11, 19]) cube([1, 1, 1]);
    translate([2, 12, 0]) cube([1, 1, 1]);
    translate([2, 12, 1]) cube([1, 1, 1]);
    translate([2, 12, 2]) cube([1, 1, 1]);
    translate([2, 12, 3]) cube([1, 1, 1]);
    translate([2, 12, 8]) cube([1, 1, 1]);
    translate([2, 12, 9]) cube([1, 1, 1]);
    translate([2, 12, 10]) cube([1, 1, 1]);
    translate([2, 12, 11]) cube([1, 1, 1]);
    translate([2, 12, 12]) cube([1, 1, 1]);
    translate([2, 12, 13]) cube([1, 1, 1]);
    translate([2, 12, 18]) cube([1, 1, 1]);
    translate([2, 12, 19]) cube([1, 1, 1]);
    translate([2, 13, 0]) cube([1, 1, 1]);
    translate([2, 13, 1]) cube([1, 1, 1]);
    translate([2, 13, 2]) cube([1, 1, 1]);
    translate([2, 13, 3]) cube([1, 1, 1]);
    translate([2, 13, 4]) cube([1, 1, 1]);
    translate([2, 13, 8]) cube([1, 1, 1]);
    translate([2, 13, 9]) cube([1, 1, 1]);
    translate([2, 13, 10]) cube([1, 1, 1]);
    translate([2, 13, 11]) cube([1, 1, 1]);
    translate([2, 13, 12]) cube([1, 1, 1]);
    translate([2, 13, 13]) cube([1, 1, 1]);
    translate([2, 13, 18]) cube([1, 1, 1]);
    translate([2, 13, 19]) cube([1, 1, 1]);
    translate([2, 14, 0]) cube([1, 1, 1]);
    translate([2, 14, 1]) cube([1, 1, 1]);
    translate([2, 14, 2]) cube([1, 1, 1]);
    translate([2, 14, 3]) cube([1, 1, 1]);
    translate([2, 14, 8]) cube([1, 1, 1]);
    translate([2, 14, 9]) cube([1, 1, 1]);
    translate([2, 14, 10]) cube([1, 1, 1]);
    translate([2, 14, 11]) cube([1, 1, 1]);
    translate([2, 14, 12]) cube([1, 1, 1]);
    translate([2, 14, 18]) cube([1, 1, 1]);
    translate([2, 14, 19]) cube([1, 1, 1]);
    translate([2, 15, 0]) cube([1, 1, 1]);
    translate([2, 15, 1]) cube([1, 1, 1]);
    translate([2, 15, 8]) cube([1, 1, 1]);
    translate([2, 15, 9]) cube([1, 1, 1]);
    translate([2, 15, 10]) cube([1, 1, 1]);
    translate([2, 15, 18]) cube([1, 1, 1]);
    translate([2, 15, 19]) cube([1, 1, 1]);
    translate([2, 18, 0]) cube([1, 1, 1]);
    translate([2, 18, 8]) cube([1, 1, 1]);
    translate([2, 18, 18]) cube([1, 1, 1]);
    translate([2, 18, 19]) cube([1, 1, 1]);
    translate([2, 19, 0]) cube([1, 1, 1]);
    translate([2, 19, 18]) cube([1, 1, 1]);
    translate([2, 19, 19]) cube([1, 1, 1]);
    translate([8, 0, 0]) cube([1, 1, 1]);
    translate([8, 0, 1]) cube([1, 1, 1]);
    translate([8, 0, 8]) cube([1, 1, 1]);
    translate([8, 0, 9]) cube([1, 1, 1]);
    translate([8, 0, 10]) cube([1, 1, 1]);
    translate([8, 0, 18]) cube([1, 1, 1]);
    translate([8, 0, 19]) cube([1, 1, 1]);
    translate([8, 1, 0]) cube([1, 1, 1]);
    translate([8, 1, 8]) cube([1, 1, 1]);
    translate([8, 1, 9]) cube([1, 1, 1]);
    translate([8, 1, 18]) cube([1, 1, 1]);
    translate([8, 1, 19]) cube([1, 1, 1]);
    translate([8, 8, 0]) cube([1, 1, 1]);
    translate([8, 8, 8]) cube([1, 1, 1]);
    translate([8, 8, 18]) cube([1, 1, 1]);
    translate([8, 8, 19]) cube([1, 1, 1]);
    translate([8, 18, 0]) cube([1, 1, 1]);
    translate([8, 18, 18]) cube([1, 1, 1]);
    translate([8, 18, 19]) cube([1, 1, 1]);
    translate([8, 19, 0]) cube([1, 1, 1]);
    translate([8, 19, 18]) cube([1, 1, 1]);
    translate([9, 0, 0]) cube([1, 1, 1]);
    translate([9, 0, 8]) cube([1, 1, 1]);
    translate([9, 0, 9]) cube([1, 1, 1]);
    translate([9, 0, 18]) cube([1, 1, 1]);
    translate([9, 0, 19]) cube([1, 1, 1]);
    translate([9, 8, 0]) cube([1, 1, 1]);
    translate([9, 8, 18]) cube([1, 1, 1]);
    translate([9, 8, 19]) cube([1, 1, 1]);
    translate([9, 18, 0]) cube([1, 1, 1]);
    translate([9, 18, 18]) cube([1, 1, 1]);
    translate([18, 0, 0]) cube([1, 1, 1]);
    translate([18, 0, 18]) cube([1, 1, 1]);
    translate([18, 0, 19]) cube([1, 1, 1]);
    translate([18, 18, 0]) cube([1, 1, 1]);
    translate([18, 18, 18]) cube([1, 1, 1]);
    translate([19, 0, 0]) cube([1, 1, 1]);
    translate([19, 0, 18]) cube([1, 1, 1]);
    translate([19, 18, 0]) cube([1, 1, 1]);
    translate([19, 18, 18]) cube([1, 1, 1]);
}
